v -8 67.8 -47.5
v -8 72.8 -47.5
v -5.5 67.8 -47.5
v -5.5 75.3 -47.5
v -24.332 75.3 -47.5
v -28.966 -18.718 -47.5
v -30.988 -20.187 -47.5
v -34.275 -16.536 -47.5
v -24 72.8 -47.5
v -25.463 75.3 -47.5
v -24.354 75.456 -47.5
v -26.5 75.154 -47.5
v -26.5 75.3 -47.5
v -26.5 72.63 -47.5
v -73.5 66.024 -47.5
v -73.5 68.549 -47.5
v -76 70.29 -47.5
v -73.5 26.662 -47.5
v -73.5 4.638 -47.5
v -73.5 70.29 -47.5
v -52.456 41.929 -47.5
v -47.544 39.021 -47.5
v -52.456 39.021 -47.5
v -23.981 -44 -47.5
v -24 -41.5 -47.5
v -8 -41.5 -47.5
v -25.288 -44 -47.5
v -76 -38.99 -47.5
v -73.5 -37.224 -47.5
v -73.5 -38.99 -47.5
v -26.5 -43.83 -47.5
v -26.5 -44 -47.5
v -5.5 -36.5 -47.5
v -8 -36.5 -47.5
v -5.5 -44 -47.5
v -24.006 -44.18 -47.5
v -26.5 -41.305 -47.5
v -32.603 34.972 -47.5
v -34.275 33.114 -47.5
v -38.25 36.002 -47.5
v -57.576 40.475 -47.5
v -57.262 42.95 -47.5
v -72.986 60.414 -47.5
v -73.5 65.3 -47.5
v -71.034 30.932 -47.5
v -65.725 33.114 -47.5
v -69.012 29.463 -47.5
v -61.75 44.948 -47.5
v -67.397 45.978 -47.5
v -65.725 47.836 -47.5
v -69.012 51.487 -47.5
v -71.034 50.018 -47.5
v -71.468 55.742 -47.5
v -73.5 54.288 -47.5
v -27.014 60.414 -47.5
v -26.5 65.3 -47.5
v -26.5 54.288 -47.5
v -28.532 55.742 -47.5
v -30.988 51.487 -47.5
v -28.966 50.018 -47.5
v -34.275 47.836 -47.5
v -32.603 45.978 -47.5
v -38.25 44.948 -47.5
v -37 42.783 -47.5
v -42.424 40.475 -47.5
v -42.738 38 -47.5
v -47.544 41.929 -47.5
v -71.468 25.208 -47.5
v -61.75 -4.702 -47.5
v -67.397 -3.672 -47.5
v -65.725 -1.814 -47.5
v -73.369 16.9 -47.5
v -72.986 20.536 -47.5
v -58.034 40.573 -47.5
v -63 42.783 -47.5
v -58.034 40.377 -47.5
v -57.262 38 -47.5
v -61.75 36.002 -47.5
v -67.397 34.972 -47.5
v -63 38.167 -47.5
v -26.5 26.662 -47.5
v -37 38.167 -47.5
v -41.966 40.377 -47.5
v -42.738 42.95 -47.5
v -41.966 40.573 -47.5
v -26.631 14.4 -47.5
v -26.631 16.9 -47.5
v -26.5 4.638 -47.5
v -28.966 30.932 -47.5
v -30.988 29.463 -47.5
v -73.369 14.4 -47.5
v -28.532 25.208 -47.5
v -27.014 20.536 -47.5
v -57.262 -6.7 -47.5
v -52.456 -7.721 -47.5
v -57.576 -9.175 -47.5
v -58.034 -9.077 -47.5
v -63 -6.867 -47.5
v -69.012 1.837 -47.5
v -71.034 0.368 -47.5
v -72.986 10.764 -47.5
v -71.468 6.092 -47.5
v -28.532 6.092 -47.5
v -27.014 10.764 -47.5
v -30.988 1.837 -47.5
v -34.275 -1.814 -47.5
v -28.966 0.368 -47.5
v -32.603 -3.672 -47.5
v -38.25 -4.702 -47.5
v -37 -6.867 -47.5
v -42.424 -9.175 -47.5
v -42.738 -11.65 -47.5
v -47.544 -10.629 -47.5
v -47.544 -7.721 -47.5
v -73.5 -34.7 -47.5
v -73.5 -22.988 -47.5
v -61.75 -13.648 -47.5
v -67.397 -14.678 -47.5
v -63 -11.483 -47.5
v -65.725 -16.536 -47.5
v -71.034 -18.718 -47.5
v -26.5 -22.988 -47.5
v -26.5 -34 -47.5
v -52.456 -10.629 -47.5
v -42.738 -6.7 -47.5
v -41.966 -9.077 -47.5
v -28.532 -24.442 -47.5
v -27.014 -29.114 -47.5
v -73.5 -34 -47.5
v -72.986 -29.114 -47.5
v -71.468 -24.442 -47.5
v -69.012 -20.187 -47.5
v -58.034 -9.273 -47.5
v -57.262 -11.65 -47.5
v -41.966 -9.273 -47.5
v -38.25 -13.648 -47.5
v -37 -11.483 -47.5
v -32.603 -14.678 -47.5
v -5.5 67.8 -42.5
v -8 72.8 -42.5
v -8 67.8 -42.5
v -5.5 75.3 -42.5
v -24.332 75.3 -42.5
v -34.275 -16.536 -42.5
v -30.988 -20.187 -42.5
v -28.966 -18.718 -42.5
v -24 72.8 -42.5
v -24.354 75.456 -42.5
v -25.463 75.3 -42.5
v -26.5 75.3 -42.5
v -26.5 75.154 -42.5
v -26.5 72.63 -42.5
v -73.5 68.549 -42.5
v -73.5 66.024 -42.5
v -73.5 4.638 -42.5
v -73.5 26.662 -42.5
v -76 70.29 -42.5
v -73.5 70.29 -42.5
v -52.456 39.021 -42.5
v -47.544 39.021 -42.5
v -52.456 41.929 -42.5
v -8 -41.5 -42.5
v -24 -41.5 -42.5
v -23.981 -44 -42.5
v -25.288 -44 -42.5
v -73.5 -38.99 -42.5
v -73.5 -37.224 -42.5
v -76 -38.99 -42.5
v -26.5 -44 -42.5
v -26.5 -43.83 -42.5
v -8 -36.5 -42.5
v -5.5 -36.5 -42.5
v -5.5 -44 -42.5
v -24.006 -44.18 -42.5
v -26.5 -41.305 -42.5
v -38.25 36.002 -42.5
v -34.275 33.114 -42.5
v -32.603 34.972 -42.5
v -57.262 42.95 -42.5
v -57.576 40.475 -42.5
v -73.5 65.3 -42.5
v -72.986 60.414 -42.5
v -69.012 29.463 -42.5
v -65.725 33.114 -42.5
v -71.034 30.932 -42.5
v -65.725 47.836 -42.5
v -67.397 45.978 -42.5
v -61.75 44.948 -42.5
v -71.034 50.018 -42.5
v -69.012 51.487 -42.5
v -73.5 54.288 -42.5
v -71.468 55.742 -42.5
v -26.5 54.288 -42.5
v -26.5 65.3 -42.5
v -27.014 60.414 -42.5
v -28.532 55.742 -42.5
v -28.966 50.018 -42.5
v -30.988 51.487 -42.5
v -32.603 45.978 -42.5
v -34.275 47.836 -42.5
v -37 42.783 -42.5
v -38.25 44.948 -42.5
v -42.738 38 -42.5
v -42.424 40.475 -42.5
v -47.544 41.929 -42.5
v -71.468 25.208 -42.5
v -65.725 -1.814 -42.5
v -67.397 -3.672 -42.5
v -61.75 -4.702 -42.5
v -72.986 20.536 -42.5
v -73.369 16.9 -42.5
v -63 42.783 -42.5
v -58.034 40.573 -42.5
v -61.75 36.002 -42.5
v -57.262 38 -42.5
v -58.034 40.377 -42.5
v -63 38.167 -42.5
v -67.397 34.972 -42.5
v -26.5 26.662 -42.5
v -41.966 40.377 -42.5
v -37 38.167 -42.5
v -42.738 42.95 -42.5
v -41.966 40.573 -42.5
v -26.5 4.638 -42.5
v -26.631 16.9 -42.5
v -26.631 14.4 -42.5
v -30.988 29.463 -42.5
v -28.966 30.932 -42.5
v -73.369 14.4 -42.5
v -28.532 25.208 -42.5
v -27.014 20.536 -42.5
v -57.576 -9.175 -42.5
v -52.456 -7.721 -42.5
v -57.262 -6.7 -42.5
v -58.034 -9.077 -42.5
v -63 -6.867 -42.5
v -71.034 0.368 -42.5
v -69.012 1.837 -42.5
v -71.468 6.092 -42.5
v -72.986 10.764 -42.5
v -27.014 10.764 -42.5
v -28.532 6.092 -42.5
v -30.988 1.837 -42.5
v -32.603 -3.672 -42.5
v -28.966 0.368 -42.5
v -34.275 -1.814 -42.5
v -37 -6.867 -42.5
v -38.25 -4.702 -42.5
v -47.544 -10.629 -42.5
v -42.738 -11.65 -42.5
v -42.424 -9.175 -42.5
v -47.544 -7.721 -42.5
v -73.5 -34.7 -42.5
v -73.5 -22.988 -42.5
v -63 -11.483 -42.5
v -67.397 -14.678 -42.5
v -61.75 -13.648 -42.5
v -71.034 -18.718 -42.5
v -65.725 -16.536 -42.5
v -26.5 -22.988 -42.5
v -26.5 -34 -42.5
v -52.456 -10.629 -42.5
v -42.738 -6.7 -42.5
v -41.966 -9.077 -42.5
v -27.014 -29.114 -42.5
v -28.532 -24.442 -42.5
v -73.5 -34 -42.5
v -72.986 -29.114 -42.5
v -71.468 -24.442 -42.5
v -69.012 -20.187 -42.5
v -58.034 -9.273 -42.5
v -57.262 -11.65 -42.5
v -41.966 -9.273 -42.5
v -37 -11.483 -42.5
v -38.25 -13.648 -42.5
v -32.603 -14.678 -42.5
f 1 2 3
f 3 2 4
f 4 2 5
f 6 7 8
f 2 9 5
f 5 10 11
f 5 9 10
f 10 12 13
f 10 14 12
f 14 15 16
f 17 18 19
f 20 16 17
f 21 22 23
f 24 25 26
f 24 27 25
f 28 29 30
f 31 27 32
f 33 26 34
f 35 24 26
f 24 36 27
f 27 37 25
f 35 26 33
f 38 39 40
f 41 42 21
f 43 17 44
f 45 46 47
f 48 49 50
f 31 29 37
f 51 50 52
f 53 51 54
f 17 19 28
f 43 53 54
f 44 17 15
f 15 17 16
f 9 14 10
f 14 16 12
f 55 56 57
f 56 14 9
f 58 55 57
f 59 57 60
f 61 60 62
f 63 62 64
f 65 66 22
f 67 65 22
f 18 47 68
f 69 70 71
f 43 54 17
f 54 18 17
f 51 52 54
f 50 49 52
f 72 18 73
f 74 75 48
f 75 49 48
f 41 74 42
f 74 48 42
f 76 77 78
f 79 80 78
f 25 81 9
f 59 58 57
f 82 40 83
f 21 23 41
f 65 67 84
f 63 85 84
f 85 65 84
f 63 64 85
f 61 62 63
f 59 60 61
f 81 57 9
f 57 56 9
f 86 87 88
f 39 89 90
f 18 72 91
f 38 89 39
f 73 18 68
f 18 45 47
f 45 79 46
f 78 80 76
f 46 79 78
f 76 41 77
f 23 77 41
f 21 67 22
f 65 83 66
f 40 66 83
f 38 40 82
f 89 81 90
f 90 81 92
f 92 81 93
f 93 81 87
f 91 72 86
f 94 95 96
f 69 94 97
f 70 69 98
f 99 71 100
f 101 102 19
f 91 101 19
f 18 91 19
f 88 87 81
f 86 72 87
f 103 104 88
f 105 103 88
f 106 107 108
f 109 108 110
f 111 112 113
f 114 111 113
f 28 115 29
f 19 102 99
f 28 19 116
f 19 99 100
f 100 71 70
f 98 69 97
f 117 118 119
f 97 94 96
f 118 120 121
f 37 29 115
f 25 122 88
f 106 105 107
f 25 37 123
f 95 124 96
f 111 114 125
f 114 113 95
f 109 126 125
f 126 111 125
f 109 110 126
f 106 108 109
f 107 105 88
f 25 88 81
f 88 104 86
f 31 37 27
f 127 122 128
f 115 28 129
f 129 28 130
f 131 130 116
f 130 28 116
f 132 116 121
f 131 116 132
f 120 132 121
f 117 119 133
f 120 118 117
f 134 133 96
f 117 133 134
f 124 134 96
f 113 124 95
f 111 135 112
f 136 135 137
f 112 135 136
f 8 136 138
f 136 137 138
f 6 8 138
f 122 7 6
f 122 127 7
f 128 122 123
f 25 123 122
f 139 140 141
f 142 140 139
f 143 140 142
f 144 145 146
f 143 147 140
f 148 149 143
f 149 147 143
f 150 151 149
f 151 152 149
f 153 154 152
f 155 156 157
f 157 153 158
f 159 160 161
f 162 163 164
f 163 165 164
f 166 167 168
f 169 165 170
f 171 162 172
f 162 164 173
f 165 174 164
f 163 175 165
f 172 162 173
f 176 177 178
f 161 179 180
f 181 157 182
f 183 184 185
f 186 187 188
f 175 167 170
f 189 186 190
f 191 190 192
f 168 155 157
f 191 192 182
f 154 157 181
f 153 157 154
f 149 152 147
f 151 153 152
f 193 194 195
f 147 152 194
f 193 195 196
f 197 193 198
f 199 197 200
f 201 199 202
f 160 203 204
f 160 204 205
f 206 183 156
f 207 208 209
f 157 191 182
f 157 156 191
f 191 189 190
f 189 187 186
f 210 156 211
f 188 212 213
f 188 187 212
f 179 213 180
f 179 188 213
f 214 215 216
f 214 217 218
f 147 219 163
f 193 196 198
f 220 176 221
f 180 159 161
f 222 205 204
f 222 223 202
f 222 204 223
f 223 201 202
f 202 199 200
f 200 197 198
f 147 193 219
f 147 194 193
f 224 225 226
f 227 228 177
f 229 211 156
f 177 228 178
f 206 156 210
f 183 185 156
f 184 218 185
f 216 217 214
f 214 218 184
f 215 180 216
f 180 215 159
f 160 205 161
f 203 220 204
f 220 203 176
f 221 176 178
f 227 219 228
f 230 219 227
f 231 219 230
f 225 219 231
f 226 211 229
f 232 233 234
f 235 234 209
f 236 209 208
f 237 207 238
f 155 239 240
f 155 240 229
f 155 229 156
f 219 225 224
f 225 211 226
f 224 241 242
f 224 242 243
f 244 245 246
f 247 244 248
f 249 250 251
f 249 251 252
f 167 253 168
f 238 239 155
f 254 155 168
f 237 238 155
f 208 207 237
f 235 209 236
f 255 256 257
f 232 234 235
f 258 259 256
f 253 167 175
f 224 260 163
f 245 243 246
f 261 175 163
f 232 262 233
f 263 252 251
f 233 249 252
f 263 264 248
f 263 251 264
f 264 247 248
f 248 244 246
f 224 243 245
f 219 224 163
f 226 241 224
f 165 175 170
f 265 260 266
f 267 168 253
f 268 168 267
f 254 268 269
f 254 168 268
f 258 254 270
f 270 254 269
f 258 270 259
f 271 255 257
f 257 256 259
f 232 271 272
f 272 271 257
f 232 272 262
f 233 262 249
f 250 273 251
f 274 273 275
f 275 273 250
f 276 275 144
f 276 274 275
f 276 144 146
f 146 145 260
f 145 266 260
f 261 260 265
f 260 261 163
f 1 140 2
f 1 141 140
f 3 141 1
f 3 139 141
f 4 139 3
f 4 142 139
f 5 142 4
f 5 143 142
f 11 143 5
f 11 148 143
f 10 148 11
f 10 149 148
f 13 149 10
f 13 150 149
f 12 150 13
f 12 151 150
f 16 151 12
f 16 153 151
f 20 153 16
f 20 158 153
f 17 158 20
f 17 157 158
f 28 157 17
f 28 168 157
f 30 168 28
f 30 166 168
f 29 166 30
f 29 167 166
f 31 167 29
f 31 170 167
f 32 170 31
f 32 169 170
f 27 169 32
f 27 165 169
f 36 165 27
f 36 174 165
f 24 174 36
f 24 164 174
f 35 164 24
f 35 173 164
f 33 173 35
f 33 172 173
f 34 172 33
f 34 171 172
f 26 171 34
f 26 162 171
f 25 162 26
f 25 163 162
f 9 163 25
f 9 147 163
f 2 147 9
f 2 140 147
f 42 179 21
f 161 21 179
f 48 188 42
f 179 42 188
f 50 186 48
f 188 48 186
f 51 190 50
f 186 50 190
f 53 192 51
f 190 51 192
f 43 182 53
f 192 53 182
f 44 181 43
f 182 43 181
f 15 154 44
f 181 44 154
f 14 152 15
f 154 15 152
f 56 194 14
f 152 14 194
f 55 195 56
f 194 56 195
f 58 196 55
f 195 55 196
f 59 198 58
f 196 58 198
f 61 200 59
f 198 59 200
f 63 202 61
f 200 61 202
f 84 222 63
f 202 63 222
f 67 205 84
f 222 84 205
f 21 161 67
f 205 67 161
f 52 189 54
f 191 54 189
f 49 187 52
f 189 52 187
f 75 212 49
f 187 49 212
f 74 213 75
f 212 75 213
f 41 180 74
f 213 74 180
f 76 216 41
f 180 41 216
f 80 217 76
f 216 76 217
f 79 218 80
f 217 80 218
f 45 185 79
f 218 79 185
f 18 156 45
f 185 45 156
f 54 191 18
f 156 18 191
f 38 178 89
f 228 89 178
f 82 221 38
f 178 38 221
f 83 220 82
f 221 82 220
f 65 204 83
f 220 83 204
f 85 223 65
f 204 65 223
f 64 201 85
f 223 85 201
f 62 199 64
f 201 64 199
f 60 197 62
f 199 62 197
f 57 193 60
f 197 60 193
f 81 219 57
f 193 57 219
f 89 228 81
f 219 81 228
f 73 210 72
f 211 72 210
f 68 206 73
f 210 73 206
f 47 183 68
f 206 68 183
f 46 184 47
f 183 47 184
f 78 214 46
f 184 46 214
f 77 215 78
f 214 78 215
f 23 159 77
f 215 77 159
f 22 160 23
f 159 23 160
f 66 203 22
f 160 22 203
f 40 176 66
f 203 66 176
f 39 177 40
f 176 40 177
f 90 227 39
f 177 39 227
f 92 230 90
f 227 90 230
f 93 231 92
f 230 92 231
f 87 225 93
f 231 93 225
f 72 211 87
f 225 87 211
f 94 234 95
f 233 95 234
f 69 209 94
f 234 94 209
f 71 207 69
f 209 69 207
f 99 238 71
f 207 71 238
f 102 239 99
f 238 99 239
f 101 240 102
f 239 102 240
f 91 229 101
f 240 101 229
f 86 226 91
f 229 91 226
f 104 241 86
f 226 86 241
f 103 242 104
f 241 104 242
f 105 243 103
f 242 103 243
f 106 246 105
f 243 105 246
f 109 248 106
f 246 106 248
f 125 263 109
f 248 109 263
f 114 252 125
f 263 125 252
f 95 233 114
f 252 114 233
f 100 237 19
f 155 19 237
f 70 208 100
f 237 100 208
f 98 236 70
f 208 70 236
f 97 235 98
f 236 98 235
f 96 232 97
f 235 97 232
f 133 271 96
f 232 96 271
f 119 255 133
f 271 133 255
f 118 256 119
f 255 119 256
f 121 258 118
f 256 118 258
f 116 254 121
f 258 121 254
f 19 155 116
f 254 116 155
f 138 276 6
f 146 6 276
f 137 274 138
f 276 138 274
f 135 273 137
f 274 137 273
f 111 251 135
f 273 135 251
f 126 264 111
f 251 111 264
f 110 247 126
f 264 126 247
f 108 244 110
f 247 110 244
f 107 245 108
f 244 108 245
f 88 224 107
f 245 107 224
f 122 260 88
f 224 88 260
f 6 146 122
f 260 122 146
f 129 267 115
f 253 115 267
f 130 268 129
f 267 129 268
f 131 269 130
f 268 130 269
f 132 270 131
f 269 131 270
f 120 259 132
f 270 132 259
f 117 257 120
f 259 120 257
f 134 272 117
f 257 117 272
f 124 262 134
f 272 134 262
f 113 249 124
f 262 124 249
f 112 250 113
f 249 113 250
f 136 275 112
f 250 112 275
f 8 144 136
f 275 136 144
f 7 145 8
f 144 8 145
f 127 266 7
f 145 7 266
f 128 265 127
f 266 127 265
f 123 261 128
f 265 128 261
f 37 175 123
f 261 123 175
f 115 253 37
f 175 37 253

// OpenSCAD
$fs=1;   // fragment length for circle
d=0.01;  // delta for extra cut

kd=19;  // key distance
cw=14;  // chamber width
ch=7.5;  // chamber height

mpt=1.5; // mount plate thickness
chw=5;   // clip hole width
chh=2;   // clip hole height
chd=0.6; // clip hole depth

thw=3.0; // teensy house width

module teensy(x,y,z) {
  tl=36;  // teensy length
  tw=18;  // teensy width
  th=4;   // teensy height
  tbh=1;  // teensy board height
  tcl=6;  // teensy connector length
  tcw=8;  // teensy connector width
  tch=3;  // teensy connector height

  translate([x*kd, y*kd, z*kd]) rotate([0,90,180]) {
    color("green") cube([tbh,tl,tw]);
    color("white") translate([tbh,-1,tw/2-tcw/2]) cube([tch,tcl,tcw]);
  }
}

module case(left=false) {
  border = 2.5;
  length = 6.3*kd;
  width = 5.7*kd;
  x_shift = 0.5*cw;
  y_shift = 1.3*cw;
  corner = 20;
  wiring_hole = 6;
  support_width = 3.5;
  sink_unit = 1;
  thickness = 5;
  fastner_shift = 8.5;
  screw_radius = 0.8+0.4;
  nut_radius = 2.0+0.4;

  key_pos = [
    [5.3,1.5,1,-1,0],[5.4,2.5,1,0,0],[5.5,3.5,1,3,0],[5.4,4.5,1,2,0],[5.3,5.5,1,0,0],
    [4.3,1.5,1,-1,0],[4.4,2.5,1,0,0],[4.5,3.5,1,3,0],[4.4,4.5,1,2,0],[4.3,5.5,1,0,0],
    [3.3,1.5,1,-1,0],[3.4,2.5,1,0,0],[3.5,3.5,1,3,0],[3.4,4.5,1,2,0],[3.3,5.5,1,0,0],
    [2.3,1.5,1,-1,0],[2.4,2.5,1,0,0],[2.5,3.5,1,3,0],[2.4,4.5,1,2,0],[2.3,5.5,1,0,0],
                                     [1.5,3.5,1,1,0],[1.4,4.5,1,0,0],[1.3,5.5,1,-2,0],
    //[-0.04,0.60,1,1.5,45],[0.66,1.35,1,1.75,30],[1.15,2.25,1,2,15],
    [0.23,0.48,1,0,35],[0.79,1.325,1,0,25],[1.20,2.25,1,0,15],
    //[0.375,0.365,1,0,30],[0.87,1.27,1,0,20],[1.20,2.25,1,0,10],
  ];
  screws = [
    [fastner_shift - 4, fastner_shift + 6],
    //[fastner_shift - 5, fastner_shift + 8],
    [fastner_shift - 4, width - fastner_shift - 6],
    [length - fastner_shift - 8, width - fastner_shift + 5],
    [length - fastner_shift - 8, fastner_shift - 5],
  ];

  module key(row,col,size,sink=0,angle=0) {
    translate([kd*(col+(size-1)/2)+border,kd*row+border,-sink*sink_unit-d]) {
      rotate([0,0,angle]) {
        translate([-(kd-cw)/2,-(kd-cw)/2,thickness+d]) cube([kd+d,kd+d,sink*sink_unit+d*2]);
        translate([0,0,-10]) cube([cw,cw,20]);
        translate([cw/2-chw/2,-chd,thickness-chh-mpt]) cube([chw,cw+chd*2,chh]);
      }
    }
  }

  module keys() {
    for (k=key_pos) key(k[0],k[1],k[2],k[3],k[4]);
  }

  module key_raise(row,col,size,sink=0) {
    if (sink < 0)
    translate([kd*(col+(size-1)/2)+border,kd*row+border,0]) {
      translate([-(kd-cw)/2,-(kd-cw)/2,thickness+d]) cube([kd+d,kd+d,-sink*sink_unit+d*2]);
    }
  }

  module key_raises() {
    for (k=key_pos) key_raise(k[0],k[1],k[2],k[3]);
  }

  module key_expansion(row,col,size,sink,angle,height,extra,extra_right) {
    if (angle != 0)
    translate([kd*(col+(size-1)/2)+border,kd*row+border,0]) {
      rotate([0,0,angle]) {
        translate([-extra/4,-extra/4]) minkowski() {
          cube([cw+extra/2+extra_right,cw+extra/2,height]);
          cylinder(r=extra/4,h=d);
        }
      }
    }
  }

  module key_expansions(height,extra,extra_right=0) {
    for (k=key_pos) key_expansion(k[0],k[1],k[2],k[3],k[4],height,extra,extra_right);
  }

  module chip_house() {
    translate([0.5*kd-border,kd*2.2+(kd-cw)/2,-d*2]) cube([kd,kd*thw,thickness+d*4]);
  }

  module writing_left(row,col,height) {
    content = "收";
    font = "WenQuanYi Micro Hei";
    translate([col*kd+16,row*kd,height+thickness-d]) rotate([0,180,0])
      linear_extrude(height+2*d) {
        text(content, font = font, size = 10);
      }
  }

  module writing_right(row,col,height) {
    content = "获";
    font = "WenQuanYi Micro Hei";
    translate([col*kd,row*kd,thickness-d])
      linear_extrude(height+2*d) {
        text(content, font = font, size = 10);
      }
  }

  module front() {
    module screw_holes() {
      for (s=screws)
        translate([s[0]+x_shift, s[1]+y_shift,-d])
          cylinder(r=screw_radius, h=thickness+d*3);
    }

    difference() {
      union() {
        translate([corner-border+x_shift,corner-border+y_shift,0]) minkowski() {
          cube([length+border*2-corner*2,width+border*2-corner*2,thickness]);
          cylinder(r=corner,h=d);
        }
        key_expansions(thickness,cw*0.8);
      }
      keys();
      screw_holes();
      chip_house();
    }
    difference() {
      key_raises();
      keys();
    }
    //if (left) writing_left(4.2,0,2);
    //else writing_right(4.2,0,2);
  }

  module back() {
    thickness = 1.5;
    front_sink = 3;
    hole_depth = border*4+2*d;

    module cable_hole(w,h) {
      translate([10+x_shift,width-3+y_shift,border+ch-h-0.5])
        cube([w,border+6,h+2*d]);
    }

    module usb_hole(w,h) {
      translate([1.25*kd+2,width+corner+border-d,ch+border-h])
        cube([w,border+2*d,h+2*d]);
    }

    module screw_holes() {
      for (s=screws) {
        translate([s[0]+x_shift, s[1]+y_shift,-d])
          union() {
            cylinder(r=screw_radius, h=ch+thickness+d*2);
            cylinder(r=nut_radius, h=1+d*2);
          }
      }
    }

    module plate() {
      difference() {
        union() {
          difference() {
            union() {
              translate([corner-border+x_shift,corner-border+y_shift,0]) minkowski() {
                cube([length+border*2-corner*2,width+border*2-corner*2,ch+thickness]);
                cylinder(r=corner,h=d);
              }
              key_expansions(ch+thickness,cw*0.8);
            }
            union() {
              translate([corner+x_shift,corner+y_shift,thickness]) minkowski() {
                cube([length-corner*2,width-corner*2,ch+thickness]);
                cylinder(r=corner,h=d);
              }
              translate([0,0,thickness]) key_expansions(ch+thickness,cw*0.8-border*2,.1);
            }
          }
          // base for screw hole
          for (s=screws)
            translate([s[0]+x_shift, s[1]+y_shift,0])
              cylinder(r=4, h=ch+thickness);
        }
        screw_holes();
        if (left) cable_hole(4.5,4.5);
        else cable_hole(7.5,4.5);
      }
    }

    plate();
  }

  // For rack-bridge: thickness=3; first_shelf=70; second_shelf=20;
  module rack() {
    thickness=2.5;
    extra=1;
    rack_width=width+border*2+thickness*2+extra;
    first_shelf=47;
    second_shelf=16;
    rack_height=first_shelf+second_shelf+thickness*3;
    hook=5;

    module rack2d() {
      difference() {
        square([rack_height, rack_width]);
        translate([thickness,-d])
          square([first_shelf,rack_width+d*2]);
        translate([thickness*2+first_shelf,thickness])
          square([second_shelf,rack_width-thickness*2]);
        translate([rack_height-thickness-d,thickness+hook])
          square([thickness+d*2,rack_width-thickness*2-hook*2]);
        translate([-d,-d]) square([thickness+d*2,hook+d*2]);
        translate([-d,rack_width-hook-d]) square([thickness+d*2,hook+d*2]);
      }

      module arc() {
        difference() {
          circle(d=first_shelf + thickness*2);
          circle(d=first_shelf);
          translate([-first_shelf/2-thickness,0])
            square([first_shelf+thickness*2, first_shelf/2+thickness]);
        }
      }

      module curvy() {
        translate([first_shelf/2+thickness,rack_width-hook*2]) arc();
        translate([first_shelf/2+thickness,rack_width/2]) rotate([180,0,0]) arc();
        translate([first_shelf/2+thickness,hook*2]) rotate([0,0,180]) arc();
        translate([first_shelf/2+thickness,rack_width/2]) arc();
      }

      module straight() {
        angle=8;
        shift=(first_shelf+thickness)*tan(angle)+0.1;
        translate([0.5,shift]) rotate([0,0,-angle])
          square([first_shelf + thickness*2, thickness]);
        translate([0,rack_width/2-thickness/2])
          square([first_shelf + thickness*2, thickness]);
        translate([0.5,rack_width-thickness-shift]) rotate([0,0,angle])
          square([first_shelf + thickness*2, thickness]);
      }

      //translate([first_shelf/2+thickness/2,first_shelf/2+hook])
      //  square([thickness,rack_width-first_shelf-hook*2]);

      curvy();
      straight();
    }
    linear_extrude(height=5) rack2d();
  }

  //front();
  //translate([0,0,-ch-20]) back();
  translate([0,13,-ch-40]) rack();
}

module chip_cover() {
  wall=0.5;
  depth=1.0;
  extra=0.2;
  translate([-2.5,kd*2.2+2.5,0]) {
    cube([kd+wall,kd*thw+wall,wall]);
    translate([wall/2,wall/2+extra,-depth]) difference() {
      cube([kd,kd*thw-extra*2,depth]);
      translate([wall,wall,-d]) cube([kd-wall*2,kd*thw-extra*2-depth,depth+d*2]);
    }
  }
}

translate([-4*kd,-3*kd,0]) {
  case(left=false);
  // For rack-bridge: translate([3,0,0]) mirror([1,0,0]) case(left=true);
  //translate([-kd,0,0]) mirror([1,0,0]) case(left=true);
  //translate([-2,0,0]) rotate([0,180,0]) teensy(0,3.5,0);
  //rotate([0,180,0]) chip_cover();
}
